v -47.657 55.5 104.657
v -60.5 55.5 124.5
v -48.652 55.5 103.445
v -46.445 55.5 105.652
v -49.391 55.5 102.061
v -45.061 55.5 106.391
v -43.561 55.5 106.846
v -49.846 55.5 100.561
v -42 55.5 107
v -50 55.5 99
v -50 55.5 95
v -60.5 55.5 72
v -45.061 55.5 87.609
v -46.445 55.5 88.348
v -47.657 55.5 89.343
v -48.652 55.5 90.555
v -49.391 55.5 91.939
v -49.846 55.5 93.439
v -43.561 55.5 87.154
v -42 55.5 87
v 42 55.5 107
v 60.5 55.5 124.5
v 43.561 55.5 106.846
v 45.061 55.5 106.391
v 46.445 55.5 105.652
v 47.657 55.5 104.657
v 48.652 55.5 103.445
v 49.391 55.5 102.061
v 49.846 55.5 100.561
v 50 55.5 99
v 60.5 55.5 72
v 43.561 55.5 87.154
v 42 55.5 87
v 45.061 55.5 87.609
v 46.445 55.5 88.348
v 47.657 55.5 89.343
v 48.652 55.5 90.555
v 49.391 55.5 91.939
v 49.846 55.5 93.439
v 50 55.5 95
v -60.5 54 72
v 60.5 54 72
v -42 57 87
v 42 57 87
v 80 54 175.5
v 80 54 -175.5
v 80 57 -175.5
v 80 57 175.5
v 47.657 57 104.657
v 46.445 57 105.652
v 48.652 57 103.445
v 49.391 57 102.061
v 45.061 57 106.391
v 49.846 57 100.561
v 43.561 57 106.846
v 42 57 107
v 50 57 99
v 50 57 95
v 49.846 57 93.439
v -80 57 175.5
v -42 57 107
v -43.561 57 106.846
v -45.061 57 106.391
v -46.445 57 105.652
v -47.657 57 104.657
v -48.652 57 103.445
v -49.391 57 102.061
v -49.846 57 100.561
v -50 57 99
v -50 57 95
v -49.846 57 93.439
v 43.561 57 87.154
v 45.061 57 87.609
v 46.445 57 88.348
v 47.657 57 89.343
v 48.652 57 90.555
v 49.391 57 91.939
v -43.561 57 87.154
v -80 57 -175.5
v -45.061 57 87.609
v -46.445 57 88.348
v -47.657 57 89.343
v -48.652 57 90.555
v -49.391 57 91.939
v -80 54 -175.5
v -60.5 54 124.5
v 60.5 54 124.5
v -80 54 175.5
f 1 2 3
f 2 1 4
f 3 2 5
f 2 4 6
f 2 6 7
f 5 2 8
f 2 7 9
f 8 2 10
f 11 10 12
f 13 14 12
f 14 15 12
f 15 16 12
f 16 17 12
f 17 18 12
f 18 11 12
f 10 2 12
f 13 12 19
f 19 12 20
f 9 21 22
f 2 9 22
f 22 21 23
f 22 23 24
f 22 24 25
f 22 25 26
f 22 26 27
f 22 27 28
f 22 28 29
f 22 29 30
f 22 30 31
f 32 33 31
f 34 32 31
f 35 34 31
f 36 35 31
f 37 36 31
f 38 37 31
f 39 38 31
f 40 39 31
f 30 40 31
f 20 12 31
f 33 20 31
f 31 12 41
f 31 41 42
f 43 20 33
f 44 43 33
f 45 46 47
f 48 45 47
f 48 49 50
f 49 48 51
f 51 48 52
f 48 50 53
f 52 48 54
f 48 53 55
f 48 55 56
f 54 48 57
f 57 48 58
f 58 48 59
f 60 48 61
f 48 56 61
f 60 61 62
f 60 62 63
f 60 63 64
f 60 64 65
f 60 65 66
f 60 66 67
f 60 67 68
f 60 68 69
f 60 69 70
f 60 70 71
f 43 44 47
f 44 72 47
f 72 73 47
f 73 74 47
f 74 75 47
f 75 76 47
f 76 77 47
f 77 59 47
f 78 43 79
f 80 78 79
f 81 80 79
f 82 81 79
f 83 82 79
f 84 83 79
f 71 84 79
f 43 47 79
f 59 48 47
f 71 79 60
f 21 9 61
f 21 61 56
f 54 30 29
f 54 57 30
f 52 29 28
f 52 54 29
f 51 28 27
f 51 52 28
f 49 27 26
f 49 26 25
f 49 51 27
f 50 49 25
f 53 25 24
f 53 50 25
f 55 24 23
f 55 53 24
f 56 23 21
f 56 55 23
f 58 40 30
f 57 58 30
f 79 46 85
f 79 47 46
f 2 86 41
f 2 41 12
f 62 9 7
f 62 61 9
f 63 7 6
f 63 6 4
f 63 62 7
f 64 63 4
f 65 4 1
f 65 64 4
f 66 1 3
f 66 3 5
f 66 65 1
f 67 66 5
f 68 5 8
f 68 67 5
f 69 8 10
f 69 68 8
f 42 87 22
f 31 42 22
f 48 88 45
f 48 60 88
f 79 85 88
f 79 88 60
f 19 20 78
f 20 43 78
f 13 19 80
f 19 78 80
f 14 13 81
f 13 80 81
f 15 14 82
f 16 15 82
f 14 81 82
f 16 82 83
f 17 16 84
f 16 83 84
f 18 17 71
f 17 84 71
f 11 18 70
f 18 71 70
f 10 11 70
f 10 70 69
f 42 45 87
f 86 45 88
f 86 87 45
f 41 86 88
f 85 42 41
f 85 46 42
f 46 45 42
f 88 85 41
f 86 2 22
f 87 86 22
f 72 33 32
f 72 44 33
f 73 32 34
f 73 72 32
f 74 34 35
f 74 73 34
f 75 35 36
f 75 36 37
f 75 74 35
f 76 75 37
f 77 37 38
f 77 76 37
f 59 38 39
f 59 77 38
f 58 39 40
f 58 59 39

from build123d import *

# Parameters (mm, degrees)
EXTRUDE_1_DEPTH          = 140
EXTRUDE_1_DEPTH_BACK     = 140
EXTRUDE_3_DEPTH          = 35.5
CUT_EXTRUDE_2_REACH      = 197.473
SKETCH_6_W               = 150
SKETCH_6_H               = 80
CUT_EXTRUDE_4_DEPTH      = 6
EXTRUDE_4_DEPTH          = 60.5
CUT_EXTRUDE_START        = -59
CUT_EXTRUDE_6_DEPTH      = 55
CUT_EXTRUDE_START_2      = -4
CUT_EXTRUDE_7_DEPTH      = 27
CUT_EXTRUDE_8_DEPTH      = 35.5
CUT_EXTRUDE_START_3      = -35.5
CUT_EXTRUDE_9_DEPTH      = 35.5
EXTRUDE_5_REACH          = 300.939
SKETCH_25_W              = 121
SKETCH_25_H              = 10
EXTRUDE_6_DEPTH          = 21.5
SKETCH_27_W              = 121
SKETCH_27_H              = 52.5
EXTRUDE_7_DEPTH          = 1.5
SKETCH_28_W              = 121
SKETCH_28_H              = 2
EXTRUDE_8_DEPTH          = 10
CUT_EXTRUDE_11_REACH     = 346.114
SKETCH_29_R              = 2
PATTERN_CIRCULAR_2_COUNT = 10
CUT_EXTRUDE_12_REACH     = 346.114
SKETCH_30_R              = 2
PATTERN_CIRCULAR_3_COUNT = 10
MIRROR_START             = -140
MIRROR_10_OUTLINE_R      = 2
MIRROR_10_DEPTH          = 280
MIRROR_10_2_OUTLINE_R    = 2
MIRROR_10_2_DEPTH        = 4
MIRROR_START_2           = 136
MIRROR_10_3_OUTLINE_R    = 2
MIRROR_10_3_DEPTH        = 4
EXTRUDE_9_REACH          = 263.648
SKETCH_31_W              = 21
SKETCH_31_H              = 16.5
EXTRUDE_10_REACH         = 292.975
SKETCH_34_W              = 121
SKETCH_34_H              = 154
EXTRUDE_11_DEPTH         = 5
EXTRUDE_12_REACH         = 378.928
SKETCH_36_W              = 121
SKETCH_36_H              = 3
EXTRUDE_13_REACH         = 378.928
SKETCH_37_W              = 121
SKETCH_37_H              = 3
SKETCH_38_W              = 100
SKETCH_38_H              = 20
CUT_EXTRUDE_13_DEPTH     = 10
FILLET_1_R               = 8
SKETCH_40_W              = 344.103621996
SKETCH_40_H              = 61.572842363
SKETCH_40_W_2            = 92.051810998
SKETCH_40_H_2            = 3
CUT_EXTRUDE_16_DEPTH     = 399


# Read off the part's stored shape, not the designer's step: 镜向10
with BuildPart() as part:
    # 草图2 → 凸台-拉伸1 (new, two sides: drawn at the far end of the back side and taken through both)
    with BuildSketch(Plane.XY.offset(-EXTRUDE_1_DEPTH_BACK)):
        with BuildLine():
            Line((60.5, 57), (80, 57))
            add(Edge.make_bspline(
                [(80, 57), (110.715171184, 57), (118.023084898, 36.99301361), (125, 20.498008369), (125, 0)],
                knots=[0, 0, 0, 0, 0, 1, 1, 1, 1, 1], degree=4))
            add(Edge.make_bspline(
                [(80, -57), (110.715171184, -57), (118.023084898, -36.99301361), (125, -20.498008369), (125, 0)],
                knots=[0, 0, 0, 0, 0, 1, 1, 1, 1, 1], degree=4))
            Line((80, -57), (60.5, -57))
            Line((60.5, -57), (60.5, -35.5))
            ThreePointArc((60.5, -35.5), (96, 0), (60.5, 35.5))
            Line((60.5, 35.5), (60.5, 57))
        make_face()
    extrude(amount=EXTRUDE_1_DEPTH + EXTRUDE_1_DEPTH_BACK)

    # 草图5 → 凸台-拉伸3 (add)
    with BuildSketch(Plane.XY.offset(140)):
        with BuildLine():
            Line((60.5, -50), (60.5, -57))
            Line((60.5, -57), (80, -57))
            add(Edge.make_bspline(
                [(80, -57), (110.715171184, -57), (118.023084898, -36.99301361), (125, -20.498008369), (125, 0)],
                knots=[0, 0, 0, 0, 0, 1, 1, 1, 1, 1], degree=4))
            add(Edge.make_bspline(
                [(125, 0), (125, 20.498008369), (118.023084898, 36.99301361), (110.715171184, 57), (80, 57)],
                knots=[0, 0, 0, 0, 0, 1, 1, 1, 1, 1], degree=4))
            Line((80, 57), (60.5, 57))
            Line((60.5, 57), (60.5, 50))
            ThreePointArc((60.5, 50), (110.5, 0), (60.5, -50))
        make_face()
    extrude_3 = extrude(amount=EXTRUDE_3_DEPTH)

    # 镜向2: 凸台-拉伸3 across plane
    add(extrude_3.mirror(Plane.XY))

    # 草图6 → 切除-拉伸2 (cut, up to next)
    with BuildSketch(Plane.ZY.offset(-60.5), mode=Mode.PRIVATE) as cut_extrude_2_sk1:
        with Locations((-15, 0)):
            Rectangle(SKETCH_6_W, SKETCH_6_H)
    cut_extrude_2_tool1 = extrude(cut_extrude_2_sk1.sketch, amount=-CUT_EXTRUDE_2_REACH, mode=Mode.PRIVATE) & part.part
    add(cut_extrude_2_tool1.solids().sort_by_distance((60.5, 0, -15))[0], mode=Mode.SUBTRACT)

    # 草图9 → 切除-拉伸4 (cut, symmetric)
    with BuildSketch(Plane(origin=(0, 0, 0), x_dir=(1, 0, 0), z_dir=(0, 1, 0))):
        Polygon((113.429186382, -60), (119.929186382, -60), (119.929186382, -75), (116.929186382, -75), (111.929186382, -69.041232037), (113.429186382, -67.541232037), align=None)
    cut_extrude_4 = extrude(amount=CUT_EXTRUDE_4_DEPTH, both=True, mode=Mode.SUBTRACT)

    # 镜向3: 切除-拉伸4 across plane
    add(cut_extrude_4.mirror(Plane(origin=(0, 0, -15), x_dir=(1, 0, 0), z_dir=(0, 0, -1))), mode=Mode.SUBTRACT)

    # 草图10 → 凸台-拉伸4 (add)
    with BuildSketch(Plane.ZY.offset(-60.5)):
        Polygon((-90, 40), (-90, 35.5), (-92, 35.5), (-92, 42), (62, 42), (62, 35.5), (60, 35.5), (60, 40), align=None)
    extrude(amount=EXTRUDE_4_DEPTH)

    # 草图18 → 切除-拉伸6 (cut)
    with BuildSketch(Plane.XY.offset(140).offset(CUT_EXTRUDE_START)):
        with BuildLine():
            Line((60.5, 54), (60.5, 35.5))
            ThreePointArc((60.5, 35.5), (96, 0), (60.5, -35.5))
            Line((60.5, -35.5), (60.5, -54))
            Line((60.5, -54), (80, -54))
            add(Edge.make_bspline(
                [(80, -54), (84.874930894, -54), (88.983824843, -53.408674679), (94.293485921, -51.914645093), (95.921328006, -51.314644751), (98.940749379, -49.944603182), (100.332473442, -49.174486853), (102.921509382, -47.489185635), (104.118858715, -46.573864409), (106.351651802, -44.617586852), (107.387031345, -43.57654345), (110.285874468, -40.291394559), (111.943828956, -37.885646851), (114.834227827, -32.778060673), (116.065931681, -30.077252128), (118.174928997, -24.486846885), (119.052306998, -21.597764181), (120.481395372, -15.683640995), (121.033233096, -12.658872533), (121.792444122, -6.461288023), (122, -3.288695832), (122, 0)],
                knots=[0, 0, 0, 0, 0.125, 0.125, 0.1875, 0.1875, 0.25, 0.25, 0.3125, 0.3125, 0.375, 0.375, 0.5, 0.5, 0.625, 0.625, 0.75, 0.75, 0.875, 0.875, 1, 1, 1, 1], degree=3))
            add(Edge.make_bspline(
                [(122, 0), (122, 3.288695832), (121.792444122, 6.461288023), (121.033233096, 12.658872533), (120.481395372, 15.683640995), (119.052306998, 21.597764181), (118.174928997, 24.486846885), (116.065931681, 30.077252128), (114.834227827, 32.778060673), (111.943828956, 37.885646851), (110.285874468, 40.291394559), (107.387031345, 43.57654345), (106.351651802, 44.617586852), (104.118858715, 46.573864409), (102.921509382, 47.489185635), (100.332473442, 49.174486853), (98.940749379, 49.944603182), (95.921328006, 51.314644751), (94.293485921, 51.914645093), (88.983824843, 53.408674679), (84.874930894, 54), (80, 54)],
                knots=[0, 0, 0, 0, 0.125, 0.125, 0.25, 0.25, 0.375, 0.375, 0.5, 0.5, 0.625, 0.625, 0.6875, 0.6875, 0.75, 0.75, 0.8125, 0.8125, 0.875, 0.875, 1, 1, 1, 1], degree=3))
            Line((80, 54), (60.5, 54))
        make_face()
    extrude(amount=CUT_EXTRUDE_6_DEPTH, mode=Mode.SUBTRACT)

    # 草图19 → 切除-拉伸7 (cut)
    with BuildSketch(Plane(origin=(0, 0, -140), x_dir=(-1, 0, 0), z_dir=(0, 0, -1)).offset(CUT_EXTRUDE_START_2)):
        with BuildLine():
            Line((-60.5, 54), (-60.5, 35.5))
            ThreePointArc((-60.5, 35.5), (-96, 0), (-60.5, -35.5))
            Line((-60.5, -35.5), (-60.5, -54))
            Line((-60.5, -54), (-80, -54))
            add(Edge.make_bspline(
                [(-80, -54), (-84.874930894, -54), (-88.983824843, -53.408674679), (-94.293485921, -51.914645093), (-95.921328006, -51.314644751), (-98.940749379, -49.944603182), (-100.332473442, -49.174486853), (-102.921509382, -47.489185635), (-104.118858715, -46.573864409), (-106.351651802, -44.617586852), (-107.387031345, -43.57654345), (-110.285874468, -40.291394559), (-111.943828956, -37.885646851), (-114.834227827, -32.778060673), (-116.065931681, -30.077252128), (-118.174928997, -24.486846885), (-119.052306998, -21.597764181), (-120.481395372, -15.683640995), (-121.033233096, -12.658872533), (-121.792444122, -6.461288023), (-122, -3.288695832), (-122, 0)],
                knots=[0, 0, 0, 0, 0.125, 0.125, 0.1875, 0.1875, 0.25, 0.25, 0.3125, 0.3125, 0.375, 0.375, 0.5, 0.5, 0.625, 0.625, 0.75, 0.75, 0.875, 0.875, 1, 1, 1, 1], degree=3))
            add(Edge.make_bspline(
                [(-122, 0), (-122, 3.288695832), (-121.792444122, 6.461288023), (-121.033233096, 12.658872533), (-120.481395372, 15.683640995), (-119.052306998, 21.597764181), (-118.174928997, 24.486846885), (-116.065931681, 30.077252128), (-114.834227827, 32.778060673), (-111.943828956, 37.885646851), (-110.285874468, 40.291394559), (-107.387031345, 43.57654345), (-106.351651802, 44.617586852), (-104.118858715, 46.573864409), (-102.921509382, 47.489185635), (-100.332473442, 49.174486853), (-98.940749379, 49.944603182), (-95.921328006, 51.314644751), (-94.293485921, 51.914645093), (-88.983824843, 53.408674679), (-84.874930894, 54), (-80, 54)],
                knots=[0, 0, 0, 0, 0.125, 0.125, 0.25, 0.25, 0.375, 0.375, 0.5, 0.5, 0.625, 0.625, 0.6875, 0.6875, 0.75, 0.75, 0.8125, 0.8125, 0.875, 0.875, 1, 1, 1, 1], degree=3))
            Line((-80, 54), (-60.5, 54))
        make_face()
    extrude(amount=-CUT_EXTRUDE_7_DEPTH, mode=Mode.SUBTRACT)

    # 草图20 → 切除-拉伸8 (cut)
    with BuildSketch(Plane.XY.offset(175.5)):
        with BuildLine():
            Line((60.5, 54), (60.5, 50))
            ThreePointArc((60.5, 50), (110.5, 0), (60.5, -50))
            Line((60.5, -50), (60.5, -54))
            Line((60.5, -54), (80, -54))
            add(Edge.make_bspline(
                [(80, -54), (84.874930894, -54), (88.983824843, -53.408674679), (94.293485921, -51.914645093), (95.921328006, -51.314644751), (98.940749379, -49.944603182), (100.332473442, -49.174486853), (102.921509382, -47.489185635), (104.118858715, -46.573864409), (106.351651802, -44.617586852), (107.387031345, -43.57654345), (110.285874468, -40.291394559), (111.943828956, -37.885646851), (114.834227827, -32.778060673), (116.065931681, -30.077252128), (118.174928997, -24.486846885), (119.052306998, -21.597764181), (120.481395372, -15.683640995), (121.033233096, -12.658872533), (121.792444122, -6.461288023), (122, -3.288695832), (122, 0)],
                knots=[0, 0, 0, 0, 0.125, 0.125, 0.1875, 0.1875, 0.25, 0.25, 0.3125, 0.3125, 0.375, 0.375, 0.5, 0.5, 0.625, 0.625, 0.75, 0.75, 0.875, 0.875, 1, 1, 1, 1], degree=3))
            add(Edge.make_bspline(
                [(122, 0), (122, 3.288695832), (121.792444122, 6.461288023), (121.033233096, 12.658872533), (120.481395372, 15.683640995), (119.052306998, 21.597764181), (118.174928997, 24.486846885), (116.065931681, 30.077252128), (114.834227827, 32.778060673), (111.943828956, 37.885646851), (110.285874468, 40.291394559), (107.387031345, 43.57654345), (106.351651802, 44.617586852), (104.118858715, 46.573864409), (102.921509382, 47.489185635), (100.332473442, 49.174486853), (98.940749379, 49.944603182), (95.921328006, 51.314644751), (94.293485921, 51.914645093), (88.983824843, 53.408674679), (84.874930894, 54), (80, 54)],
                knots=[0, 0, 0, 0, 0.125, 0.125, 0.25, 0.25, 0.375, 0.375, 0.5, 0.5, 0.625, 0.625, 0.6875, 0.6875, 0.75, 0.75, 0.8125, 0.8125, 0.875, 0.875, 1, 1, 1, 1], degree=3))
            Line((80, 54), (60.5, 54))
        make_face()
    extrude(amount=-CUT_EXTRUDE_8_DEPTH, mode=Mode.SUBTRACT)

    # 草图21 → 切除-拉伸9 (cut)
    with BuildSketch(Plane(origin=(0, 0, -175.5), x_dir=(-1, 0, 0), z_dir=(0, 0, -1)).offset(CUT_EXTRUDE_START_3)):
        with BuildLine():
            Line((-60.5, -50), (-60.5, -54))
            Line((-60.5, -54), (-80, -54))
            add(Edge.make_bspline(
                [(-80, -54), (-84.874930894, -54), (-88.983824843, -53.408674679), (-94.293485921, -51.914645093), (-95.921328006, -51.314644751), (-98.940749379, -49.944603182), (-100.332473442, -49.174486853), (-102.921509382, -47.489185635), (-104.118858715, -46.573864409), (-106.351651802, -44.617586852), (-107.387031345, -43.57654345), (-110.285874468, -40.291394559), (-111.943828956, -37.885646851), (-114.834227827, -32.778060673), (-116.065931681, -30.077252128), (-118.174928997, -24.486846885), (-119.052306998, -21.597764181), (-120.481395372, -15.683640995), (-121.033233096, -12.658872533), (-121.792444122, -6.461288023), (-122, -3.288695832), (-122, 0)],
                knots=[0, 0, 0, 0, 0.125, 0.125, 0.1875, 0.1875, 0.25, 0.25, 0.3125, 0.3125, 0.375, 0.375, 0.5, 0.5, 0.625, 0.625, 0.75, 0.75, 0.875, 0.875, 1, 1, 1, 1], degree=3))
            add(Edge.make_bspline(
                [(-122, 0), (-122, 3.288695832), (-121.792444122, 6.461288023), (-121.033233096, 12.658872533), (-120.481395372, 15.683640995), (-119.052306998, 21.597764181), (-118.174928997, 24.486846885), (-116.065931681, 30.077252128), (-114.834227827, 32.778060673), (-111.943828956, 37.885646851), (-110.285874468, 40.291394559), (-107.387031345, 43.57654345), (-106.351651802, 44.617586852), (-104.118858715, 46.573864409), (-102.921509382, 47.489185635), (-100.332473442, 49.174486853), (-98.940749379, 49.944603182), (-95.921328006, 51.314644751), (-94.293485921, 51.914645093), (-88.983824843, 53.408674679), (-84.874930894, 54), (-80, 54)],
                knots=[0, 0, 0, 0, 0.125, 0.125, 0.25, 0.25, 0.375, 0.375, 0.5, 0.5, 0.625, 0.625, 0.6875, 0.6875, 0.75, 0.75, 0.8125, 0.8125, 0.875, 0.875, 1, 1, 1, 1], degree=3))
            Line((-80, 54), (-60.5, 54))
            Line((-60.5, 54), (-60.5, 50))
            ThreePointArc((-60.5, 50), (-110.5, 0), (-60.5, -50))
        make_face()
    extrude(amount=CUT_EXTRUDE_9_DEPTH, mode=Mode.SUBTRACT)

    # 镜向9: part across plane


with BuildPart() as part_1:
    add(part.part)
    add(part.part.mirror(Plane.ZY))

    # 草图23 → 凸台-拉伸5 (add, up to next)
    with BuildSketch(Plane.XY.offset(-90), mode=Mode.PRIVATE) as extrude_5_sk1:
        with BuildLine():
            Line((-114.034351089, 40), (-110, 40))
            Line((-110, 40), (-110, -40))
            Line((-110, -40), (-114.034351089, -40))
            add(Edge.make_bspline(
                [(-114.034351089, -40), (-119.771865737, -31.446745908), (-122.888445187, -21.34184926), (-125, -11.276676628), (-125, 0)],
                knots=[0.449864766, 0.449864766, 0.449864766, 0.449864766, 0.449864766, 1, 1, 1, 1, 1], degree=4))
            add(Edge.make_bspline(
                [(-125, 0), (-125, 11.276676628), (-122.888445187, 21.34184926), (-119.771865737, 31.446745908), (-114.034351089, 40)],
                knots=[0, 0, 0, 0, 0, 0.550135234, 0.550135234, 0.550135234, 0.550135234, 0.550135234], degree=4))
        make_face()
    extrude_5_tool1 = extrude(extrude_5_sk1.sketch, amount=EXTRUDE_5_REACH, mode=Mode.PRIVATE) - part_1.part
    add(extrude_5_tool1.solids().sort_by_distance((-116.2158, 0, -90))[0])

    # 草图25 → 凸台-拉伸6 (add)
    with BuildSketch(Plane(origin=(0, 57, 0), x_dir=(1, 0, 0), z_dir=(0, 1, 0))):
        with Locations((0, -67)):
            Rectangle(SKETCH_25_W, SKETCH_25_H)
    extrude(amount=-EXTRUDE_6_DEPTH)



with BuildPart() as body_2:
    # 草图27 → 凸台-拉伸7 (new body)
    with BuildSketch(Plane(origin=(0, 57, 0), x_dir=(1, 0, 0), z_dir=(0, 1, 0))):
        with Locations((0, -98.25)):
            Rectangle(SKETCH_27_W, SKETCH_27_H)
    extrude(amount=-EXTRUDE_7_DEPTH)


with BuildPart() as part_2:
    add(part_1.part)

    add(body_2.part)  # 凸台-拉伸8 merges body 2
    # 草图28 → 凸台-拉伸8 (add)
    with BuildSketch(Plane(origin=(0, 57, 0), x_dir=(1, 0, 0), z_dir=(0, 1, 0))):
        with Locations((0, -125.5)):
            Rectangle(SKETCH_28_W, SKETCH_28_H)
    extrude(amount=-EXTRUDE_8_DEPTH)

    # 草图29 → 切除-拉伸11 (cut, up to next)
    with BuildSketch(Plane.XY.offset(140), mode=Mode.PRIVATE) as cut_extrude_11_sk1:
        with Locations((-85.186980596, 33.978713764)):
            Circle(SKETCH_29_R)
    cut_extrude_11_tool1 = extrude(cut_extrude_11_sk1.sketch, amount=-CUT_EXTRUDE_11_REACH, mode=Mode.PRIVATE) & part_2.part
    cut_extrude_11 = cut_extrude_11_tool1.solids().sort_by_distance((-85.186981, 33.978714, 140))[0]
    add(cut_extrude_11, mode=Mode.SUBTRACT)

    # 阵列(圆周)2: 切除-拉伸11 ×10 about axis, 6 skipped
    pattern_circular_2_axis = Axis((-60.5, 0, 140), (0, 0, -1))
    add([cut_extrude_11.rotate(pattern_circular_2_axis, i * 360 / PATTERN_CIRCULAR_2_COUNT) for i in range(1, PATTERN_CIRCULAR_2_COUNT) if i not in (1, 2, 3, 4, 5, 6)], mode=Mode.SUBTRACT)

    # 草图30 → 切除-拉伸12 (cut, up to next)
    with BuildSketch(Plane(origin=(0, 0, -140), x_dir=(-1, 0, 0), z_dir=(0, 0, -1)), mode=Mode.PRIVATE) as cut_extrude_12_sk1:
        with Locations(Location((85.186980596, 33.978713764, 0), (0, 0, 180))):
            Circle(SKETCH_30_R)
    cut_extrude_12_tool1 = extrude(cut_extrude_12_sk1.sketch, amount=-CUT_EXTRUDE_12_REACH, mode=Mode.PRIVATE) & part_2.part
    cut_extrude_12 = cut_extrude_12_tool1.solids().sort_by_distance((-85.186981, 33.978714, -140))[0]
    add(cut_extrude_12, mode=Mode.SUBTRACT)

    # 阵列(圆周)3: 切除-拉伸12 ×10 about axis, 6 skipped
    pattern_circular_3_axis = Axis((-60.5, 0, 140), (0, 0, -1))
    add([cut_extrude_12.rotate(pattern_circular_3_axis, i * 360 / PATTERN_CIRCULAR_3_COUNT) for i in range(1, PATTERN_CIRCULAR_3_COUNT) if i not in (1, 2, 3, 4, 5, 6)], mode=Mode.SUBTRACT)

    # 镜向10 outline → 镜向10 (cut)
    with BuildSketch(Plane.XY.offset(MIRROR_START)):
        with Locations((85.186980596, 33.978713764)):
            Circle(MIRROR_10_OUTLINE_R)
    extrude(amount=MIRROR_10_DEPTH, mode=Mode.SUBTRACT)

    # Mirror 10 2 outline → Mirror 10 2 (cut)
    with BuildSketch(Plane.XY.offset(MIRROR_START)):
        with Locations((100.444373684, 12.978713764)):
            Circle(MIRROR_10_2_OUTLINE_R)
        with Locations((100.444373684, -12.978713764)):
            Circle(MIRROR_10_2_OUTLINE_R)
        with Locations((85.186980596, -33.978713764)):
            Circle(MIRROR_10_2_OUTLINE_R)
    extrude(amount=MIRROR_10_2_DEPTH, mode=Mode.SUBTRACT)

    # Mirror 10 3 outline → Mirror 10 3 (cut)
    with BuildSketch(Plane.XY.offset(MIRROR_START_2)):
        with Locations((100.444373684, 12.978713764)):
            Circle(MIRROR_10_3_OUTLINE_R)
        with Locations((100.444373684, -12.978713764)):
            Circle(MIRROR_10_3_OUTLINE_R)
        with Locations((85.186980596, -33.978713764)):
            Circle(MIRROR_10_3_OUTLINE_R)
    extrude(amount=MIRROR_10_3_DEPTH, mode=Mode.SUBTRACT)

    # 草图31 → 凸台-拉伸9 (add, up to next)
    with BuildSketch(Plane(origin=(-60.5, 0, 0), x_dir=(0, 0, -1), z_dir=(1, 0, 0)), mode=Mode.PRIVATE) as extrude_9_sk1:
        with Locations((-70.5, -43.75)):
            Rectangle(SKETCH_31_W, SKETCH_31_H)
    extrude_9_tool1 = extrude(extrude_9_sk1.sketch, amount=EXTRUDE_9_REACH, mode=Mode.PRIVATE) - part_2.part
    # 草图31 → 凸台-拉伸9 (add, up to next)
    with BuildSketch(Plane(origin=(-60.5, 0, 0), x_dir=(0, 0, -1), z_dir=(1, 0, 0)), mode=Mode.PRIVATE) as extrude_9_sk2:
        Polygon((109, -52), (109, -35.5), (90, -35.5), (90, -40), (90, -52), align=None)
    extrude_9_tool2 = extrude(extrude_9_sk2.sketch, amount=EXTRUDE_9_REACH, mode=Mode.PRIVATE) - part_2.part
    add(extrude_9_tool1.solids().sort_by_distance((-60.5, -43.75, 70.5))[0])
    add(extrude_9_tool2.solids().sort_by_distance((-60.5, -43.75, -99.5))[0])

    # 草图33 → 凸台-拉伸10 (add, up to next)
    with BuildSketch(Plane.XY.offset(81), mode=Mode.PRIVATE) as extrude_10_sk1:
        with BuildLine():
            Line((62.5, 54), (62.5, 35.443617197))
            ThreePointArc((62.5, 35.443617197), (61.500397299, 35.4859015), (60.5, 35.5))
            Line((60.5, 35.5), (60.5, 54))
            Line((60.5, 54), (62.5, 54))
        make_face()
    extrude_10_tool1 = extrude(extrude_10_sk1.sketch, amount=EXTRUDE_10_REACH, mode=Mode.PRIVATE) - part_2.part
    extrude_10 = extrude_10_tool1.solids().sort_by_distance((61.500507, 44.740598, 81))[0]
    add(extrude_10)

    # 镜向11: 凸台-拉伸10 across plane
    add(extrude_10.mirror(Plane(origin=(0, 0, 0), x_dir=(0, 0, 1), z_dir=(1, 0, 0))))

    # 草图34 → 凸台-拉伸11 (add)
    with BuildSketch(Plane(origin=(0, 42, 0), x_dir=(1, 0, 0), z_dir=(0, 1, 0))):
        with Locations((0, 15)):
            Rectangle(SKETCH_34_W, SKETCH_34_H)
    extrude(amount=EXTRUDE_11_DEPTH)

    # 草图36 → 凸台-拉伸12 (add, up to next)
    with BuildSketch(Plane.XY.offset(175.5), mode=Mode.PRIVATE) as extrude_12_sk1:
        with Locations((0, 55.5)):
            Rectangle(SKETCH_36_W, SKETCH_36_H)
    extrude_12_tool1 = extrude(extrude_12_sk1.sketch, amount=-EXTRUDE_12_REACH, mode=Mode.PRIVATE) - part_2.part
    add(extrude_12_tool1.solids().sort_by_distance((0, 55.5, 175.5))[0])

    # 草图37 → 凸台-拉伸13 (add, up to next)
    with BuildSketch(Plane(origin=(0, 0, -175.5), x_dir=(-1, 0, 0), z_dir=(0, 0, -1)), mode=Mode.PRIVATE) as extrude_13_sk1:
        with Locations((0, 55.5)):
            Rectangle(SKETCH_37_W, SKETCH_37_H)
    extrude_13_tool1 = extrude(extrude_13_sk1.sketch, amount=-EXTRUDE_13_REACH, mode=Mode.PRIVATE) - part_2.part
    add(extrude_13_tool1.solids().sort_by_distance((0, 55.5, -175.5))[0])

    # 草图38 → 切除-拉伸13 (cut)
    with BuildSketch(Plane.XZ.offset(-55.5)):
        with Locations((0, 97)):
            Rectangle(SKETCH_38_W, SKETCH_38_H)
    extrude(amount=-CUT_EXTRUDE_13_DEPTH, mode=Mode.SUBTRACT)

    # 圆角1
    fillet_1_edges = [part_2.edges().sort_by_distance(p)[0] for p in [
        (50, 56.25, 107),
        (50, 56.25, 87),
        (-50, 56.25, 87),
        (-50, 56.25, 107),
    ]]
    fillet(fillet_1_edges, radius=FILLET_1_R)

    # 草图40 → 切除-拉伸16 (cut)
    with BuildSketch(Plane(origin=(0, 0, -175.5), x_dir=(-1, 0, 0), z_dir=(0, 0, -1))):
        Polygon((-172.051810998, 54), (-172.051810998, -54), (172.051810998, -54), (172.051810998, 54), (80, 54), (-80, 54), align=None)
        with Locations((0, -84.786421182)):
            Rectangle(SKETCH_40_W, SKETCH_40_H)
        with Locations((-126.025905499, 55.5)):
            Rectangle(SKETCH_40_W_2, SKETCH_40_H_2)
        with Locations((126.025905499, 55.5)):
            Rectangle(SKETCH_40_W_2, SKETCH_40_H_2)
    extrude(amount=-CUT_EXTRUDE_16_DEPTH, mode=Mode.SUBTRACT)


solid = part_2.part
